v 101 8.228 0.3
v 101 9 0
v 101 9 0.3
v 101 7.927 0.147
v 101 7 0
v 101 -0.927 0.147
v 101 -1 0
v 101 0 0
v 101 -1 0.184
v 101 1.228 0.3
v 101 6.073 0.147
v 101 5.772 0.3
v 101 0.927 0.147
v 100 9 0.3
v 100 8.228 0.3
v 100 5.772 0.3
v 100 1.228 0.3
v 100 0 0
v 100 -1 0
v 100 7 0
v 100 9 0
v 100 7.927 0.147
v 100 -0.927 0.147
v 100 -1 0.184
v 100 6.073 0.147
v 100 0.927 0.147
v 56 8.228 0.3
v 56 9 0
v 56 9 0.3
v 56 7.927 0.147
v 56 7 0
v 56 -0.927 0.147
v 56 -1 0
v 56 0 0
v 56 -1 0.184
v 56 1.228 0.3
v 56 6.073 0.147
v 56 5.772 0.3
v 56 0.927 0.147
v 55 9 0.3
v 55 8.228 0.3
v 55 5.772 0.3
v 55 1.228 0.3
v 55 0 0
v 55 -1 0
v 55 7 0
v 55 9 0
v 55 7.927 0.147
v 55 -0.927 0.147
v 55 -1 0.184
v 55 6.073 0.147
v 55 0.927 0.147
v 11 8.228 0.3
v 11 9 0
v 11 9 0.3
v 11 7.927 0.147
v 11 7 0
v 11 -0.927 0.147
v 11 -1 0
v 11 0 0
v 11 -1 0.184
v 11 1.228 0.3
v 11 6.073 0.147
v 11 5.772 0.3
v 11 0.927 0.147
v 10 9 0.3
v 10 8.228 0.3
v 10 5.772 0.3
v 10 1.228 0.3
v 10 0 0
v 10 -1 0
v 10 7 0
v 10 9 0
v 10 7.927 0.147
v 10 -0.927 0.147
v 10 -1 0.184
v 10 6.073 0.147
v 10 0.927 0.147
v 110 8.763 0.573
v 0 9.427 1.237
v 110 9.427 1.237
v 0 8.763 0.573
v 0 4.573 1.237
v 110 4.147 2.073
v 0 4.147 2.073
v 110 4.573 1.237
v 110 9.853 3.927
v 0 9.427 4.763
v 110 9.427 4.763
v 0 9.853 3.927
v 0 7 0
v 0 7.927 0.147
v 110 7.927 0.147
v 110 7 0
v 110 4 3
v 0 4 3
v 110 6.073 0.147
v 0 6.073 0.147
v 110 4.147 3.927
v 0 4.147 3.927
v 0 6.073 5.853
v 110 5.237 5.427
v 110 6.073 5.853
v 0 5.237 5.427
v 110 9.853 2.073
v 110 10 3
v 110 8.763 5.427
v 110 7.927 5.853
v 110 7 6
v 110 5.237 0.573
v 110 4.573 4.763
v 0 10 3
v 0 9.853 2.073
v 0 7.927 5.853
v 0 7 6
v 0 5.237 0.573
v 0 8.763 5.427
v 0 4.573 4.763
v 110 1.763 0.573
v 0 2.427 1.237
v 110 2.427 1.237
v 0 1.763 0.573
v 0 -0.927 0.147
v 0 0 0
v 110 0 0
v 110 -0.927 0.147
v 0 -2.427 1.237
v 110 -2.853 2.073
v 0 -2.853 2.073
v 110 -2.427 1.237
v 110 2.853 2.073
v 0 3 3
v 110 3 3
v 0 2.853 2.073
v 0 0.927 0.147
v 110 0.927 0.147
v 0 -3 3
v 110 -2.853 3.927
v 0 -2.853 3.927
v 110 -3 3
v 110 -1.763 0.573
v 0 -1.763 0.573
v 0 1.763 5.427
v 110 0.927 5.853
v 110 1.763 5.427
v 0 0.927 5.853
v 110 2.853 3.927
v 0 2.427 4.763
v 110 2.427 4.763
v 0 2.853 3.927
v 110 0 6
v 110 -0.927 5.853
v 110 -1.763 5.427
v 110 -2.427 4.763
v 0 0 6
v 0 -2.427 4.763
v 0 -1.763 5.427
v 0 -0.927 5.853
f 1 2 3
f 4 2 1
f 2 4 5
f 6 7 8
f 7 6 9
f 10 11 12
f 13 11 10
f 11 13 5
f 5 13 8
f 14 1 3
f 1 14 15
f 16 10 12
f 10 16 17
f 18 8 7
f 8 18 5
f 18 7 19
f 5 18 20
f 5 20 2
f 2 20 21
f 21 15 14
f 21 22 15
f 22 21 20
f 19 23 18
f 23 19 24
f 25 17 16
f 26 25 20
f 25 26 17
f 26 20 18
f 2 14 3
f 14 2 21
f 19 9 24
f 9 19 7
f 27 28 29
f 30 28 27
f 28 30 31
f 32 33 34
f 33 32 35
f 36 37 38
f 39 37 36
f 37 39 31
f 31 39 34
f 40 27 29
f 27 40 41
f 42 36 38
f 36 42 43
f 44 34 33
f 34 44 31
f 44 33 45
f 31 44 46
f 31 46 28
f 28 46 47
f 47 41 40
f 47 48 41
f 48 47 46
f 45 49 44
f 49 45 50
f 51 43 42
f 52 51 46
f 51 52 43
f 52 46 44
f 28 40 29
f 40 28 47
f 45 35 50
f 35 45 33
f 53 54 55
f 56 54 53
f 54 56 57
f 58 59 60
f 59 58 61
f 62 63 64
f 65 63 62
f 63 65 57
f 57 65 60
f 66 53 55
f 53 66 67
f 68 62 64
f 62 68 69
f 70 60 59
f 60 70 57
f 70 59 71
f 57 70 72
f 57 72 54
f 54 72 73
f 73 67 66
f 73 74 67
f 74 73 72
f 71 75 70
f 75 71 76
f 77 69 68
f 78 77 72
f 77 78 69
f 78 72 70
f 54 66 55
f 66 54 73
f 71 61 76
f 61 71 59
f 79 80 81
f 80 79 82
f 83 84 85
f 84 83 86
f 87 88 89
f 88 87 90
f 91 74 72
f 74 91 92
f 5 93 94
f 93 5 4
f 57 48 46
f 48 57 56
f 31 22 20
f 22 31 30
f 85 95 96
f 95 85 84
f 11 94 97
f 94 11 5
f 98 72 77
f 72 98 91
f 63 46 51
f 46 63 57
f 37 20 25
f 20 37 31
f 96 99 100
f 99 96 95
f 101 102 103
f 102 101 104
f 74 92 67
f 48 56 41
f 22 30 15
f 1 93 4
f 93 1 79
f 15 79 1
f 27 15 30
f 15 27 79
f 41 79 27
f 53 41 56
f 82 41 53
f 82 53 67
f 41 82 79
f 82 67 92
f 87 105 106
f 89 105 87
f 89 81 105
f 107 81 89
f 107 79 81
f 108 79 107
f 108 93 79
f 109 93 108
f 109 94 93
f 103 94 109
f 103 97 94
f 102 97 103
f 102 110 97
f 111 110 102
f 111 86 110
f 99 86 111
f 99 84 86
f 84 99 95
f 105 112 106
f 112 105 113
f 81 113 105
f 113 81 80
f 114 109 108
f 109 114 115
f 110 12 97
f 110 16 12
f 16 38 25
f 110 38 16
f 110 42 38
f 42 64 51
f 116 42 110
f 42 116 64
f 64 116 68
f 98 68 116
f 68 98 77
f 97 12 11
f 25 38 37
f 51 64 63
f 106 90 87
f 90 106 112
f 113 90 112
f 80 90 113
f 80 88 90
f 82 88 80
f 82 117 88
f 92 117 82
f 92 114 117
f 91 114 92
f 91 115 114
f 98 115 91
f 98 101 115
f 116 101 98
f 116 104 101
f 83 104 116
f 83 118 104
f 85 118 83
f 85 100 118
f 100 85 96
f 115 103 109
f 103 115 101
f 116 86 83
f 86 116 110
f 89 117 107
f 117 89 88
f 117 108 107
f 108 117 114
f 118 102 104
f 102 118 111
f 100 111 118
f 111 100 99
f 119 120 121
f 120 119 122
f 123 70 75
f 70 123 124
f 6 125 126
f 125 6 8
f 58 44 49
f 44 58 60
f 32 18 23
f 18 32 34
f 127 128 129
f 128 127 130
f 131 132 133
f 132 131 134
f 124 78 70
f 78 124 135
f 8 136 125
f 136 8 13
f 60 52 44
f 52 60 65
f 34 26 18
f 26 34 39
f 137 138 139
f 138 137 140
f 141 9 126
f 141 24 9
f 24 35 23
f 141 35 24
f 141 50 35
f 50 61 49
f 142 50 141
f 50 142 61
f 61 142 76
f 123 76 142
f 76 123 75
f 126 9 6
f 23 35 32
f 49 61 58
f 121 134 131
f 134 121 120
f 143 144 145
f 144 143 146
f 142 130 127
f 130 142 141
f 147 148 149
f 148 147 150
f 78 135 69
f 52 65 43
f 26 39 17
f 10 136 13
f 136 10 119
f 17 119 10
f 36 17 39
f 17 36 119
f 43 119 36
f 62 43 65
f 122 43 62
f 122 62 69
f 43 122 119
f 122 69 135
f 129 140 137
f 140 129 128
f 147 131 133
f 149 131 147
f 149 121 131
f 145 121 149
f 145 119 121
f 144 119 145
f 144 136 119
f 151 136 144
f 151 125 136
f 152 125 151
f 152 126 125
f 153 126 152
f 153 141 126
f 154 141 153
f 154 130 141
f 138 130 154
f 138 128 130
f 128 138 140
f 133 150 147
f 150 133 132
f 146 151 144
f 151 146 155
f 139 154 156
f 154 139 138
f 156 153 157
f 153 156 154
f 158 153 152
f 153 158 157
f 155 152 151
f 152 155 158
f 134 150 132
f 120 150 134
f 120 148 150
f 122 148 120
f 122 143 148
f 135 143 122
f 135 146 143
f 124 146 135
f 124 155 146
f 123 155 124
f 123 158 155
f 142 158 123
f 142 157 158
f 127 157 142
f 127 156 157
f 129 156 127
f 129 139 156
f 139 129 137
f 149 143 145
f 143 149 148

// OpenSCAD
$fn=20;

translate ([100,-1,0]){
cube ([1,10,0.3]);
}

translate ([55,-1,0]){
cube ([1,10,0.3]);
}

translate ([10,-1,0]){
cube ([1,10,0.3]);
}

translate ([0,7,3]){
rotate([0,90,0]){
cylinder (h=110, d=6);
}}

translate ([0,0,3]){
rotate([0,90,0]){
cylinder (h=110, d=6);
}}
